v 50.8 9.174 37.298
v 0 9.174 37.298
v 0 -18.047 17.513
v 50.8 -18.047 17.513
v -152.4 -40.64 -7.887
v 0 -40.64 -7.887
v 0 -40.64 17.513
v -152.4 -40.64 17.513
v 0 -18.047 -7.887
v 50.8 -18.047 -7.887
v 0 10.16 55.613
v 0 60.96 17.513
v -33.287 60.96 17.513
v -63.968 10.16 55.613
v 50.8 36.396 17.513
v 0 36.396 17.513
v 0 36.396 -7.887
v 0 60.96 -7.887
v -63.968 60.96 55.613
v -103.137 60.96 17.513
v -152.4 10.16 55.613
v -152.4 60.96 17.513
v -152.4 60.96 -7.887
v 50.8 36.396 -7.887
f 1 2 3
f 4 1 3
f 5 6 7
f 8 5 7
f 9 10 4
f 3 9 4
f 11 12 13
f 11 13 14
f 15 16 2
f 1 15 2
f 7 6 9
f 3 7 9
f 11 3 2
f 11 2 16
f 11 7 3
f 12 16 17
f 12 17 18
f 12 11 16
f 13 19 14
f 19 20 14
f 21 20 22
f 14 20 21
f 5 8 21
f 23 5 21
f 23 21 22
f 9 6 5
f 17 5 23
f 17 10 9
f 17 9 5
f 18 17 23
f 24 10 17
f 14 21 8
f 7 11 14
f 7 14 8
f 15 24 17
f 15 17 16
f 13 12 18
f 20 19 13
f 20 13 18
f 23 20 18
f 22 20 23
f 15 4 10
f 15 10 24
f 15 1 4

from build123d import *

# Parameters (mm, degrees)
F0_W     = 101.6
F0_H     = 25.4
F1_DEPTH = 152.4
F2_W     = 54.442895
F2_H     = 25.4
F3_DEPTH = 50.8
F5_DEPTH = 50.8


with BuildPart() as f1:
    # F0 (on Right) → F1 (new body)
    with BuildSketch(Plane.YZ):
        with Locations((10.159998, 4.812631)):
            Rectangle(F0_W, F0_H)
        Polygon((10.159998, 55.612631), (-40.640002, 17.512631), (60.959998, 17.512631), align=None)
    extrude(amount=-F1_DEPTH)

    # F2 (on face) → F3 (join)
    with BuildSketch(Plane.YZ):
        Polygon((9.17408, 37.297897), (-18.047368, 17.512631), (36.395527, 17.512631), align=None)
        with Locations((9.17408, 4.812631)):
            Rectangle(F2_W, F2_H)
    extrude(amount=F3_DEPTH)

    # F4 (on face) → F5 (join)
    with BuildSketch(Plane(origin=(0, 60.959998, 0), x_dir=(-1, 0, 0), z_dir=(0, 1, 0))):
        Polygon((63.967891, 55.612631), (33.287369, 17.512631), (103.137369, 17.512631), align=None)
    extrude(amount=-F5_DEPTH)


solid = f1.part
